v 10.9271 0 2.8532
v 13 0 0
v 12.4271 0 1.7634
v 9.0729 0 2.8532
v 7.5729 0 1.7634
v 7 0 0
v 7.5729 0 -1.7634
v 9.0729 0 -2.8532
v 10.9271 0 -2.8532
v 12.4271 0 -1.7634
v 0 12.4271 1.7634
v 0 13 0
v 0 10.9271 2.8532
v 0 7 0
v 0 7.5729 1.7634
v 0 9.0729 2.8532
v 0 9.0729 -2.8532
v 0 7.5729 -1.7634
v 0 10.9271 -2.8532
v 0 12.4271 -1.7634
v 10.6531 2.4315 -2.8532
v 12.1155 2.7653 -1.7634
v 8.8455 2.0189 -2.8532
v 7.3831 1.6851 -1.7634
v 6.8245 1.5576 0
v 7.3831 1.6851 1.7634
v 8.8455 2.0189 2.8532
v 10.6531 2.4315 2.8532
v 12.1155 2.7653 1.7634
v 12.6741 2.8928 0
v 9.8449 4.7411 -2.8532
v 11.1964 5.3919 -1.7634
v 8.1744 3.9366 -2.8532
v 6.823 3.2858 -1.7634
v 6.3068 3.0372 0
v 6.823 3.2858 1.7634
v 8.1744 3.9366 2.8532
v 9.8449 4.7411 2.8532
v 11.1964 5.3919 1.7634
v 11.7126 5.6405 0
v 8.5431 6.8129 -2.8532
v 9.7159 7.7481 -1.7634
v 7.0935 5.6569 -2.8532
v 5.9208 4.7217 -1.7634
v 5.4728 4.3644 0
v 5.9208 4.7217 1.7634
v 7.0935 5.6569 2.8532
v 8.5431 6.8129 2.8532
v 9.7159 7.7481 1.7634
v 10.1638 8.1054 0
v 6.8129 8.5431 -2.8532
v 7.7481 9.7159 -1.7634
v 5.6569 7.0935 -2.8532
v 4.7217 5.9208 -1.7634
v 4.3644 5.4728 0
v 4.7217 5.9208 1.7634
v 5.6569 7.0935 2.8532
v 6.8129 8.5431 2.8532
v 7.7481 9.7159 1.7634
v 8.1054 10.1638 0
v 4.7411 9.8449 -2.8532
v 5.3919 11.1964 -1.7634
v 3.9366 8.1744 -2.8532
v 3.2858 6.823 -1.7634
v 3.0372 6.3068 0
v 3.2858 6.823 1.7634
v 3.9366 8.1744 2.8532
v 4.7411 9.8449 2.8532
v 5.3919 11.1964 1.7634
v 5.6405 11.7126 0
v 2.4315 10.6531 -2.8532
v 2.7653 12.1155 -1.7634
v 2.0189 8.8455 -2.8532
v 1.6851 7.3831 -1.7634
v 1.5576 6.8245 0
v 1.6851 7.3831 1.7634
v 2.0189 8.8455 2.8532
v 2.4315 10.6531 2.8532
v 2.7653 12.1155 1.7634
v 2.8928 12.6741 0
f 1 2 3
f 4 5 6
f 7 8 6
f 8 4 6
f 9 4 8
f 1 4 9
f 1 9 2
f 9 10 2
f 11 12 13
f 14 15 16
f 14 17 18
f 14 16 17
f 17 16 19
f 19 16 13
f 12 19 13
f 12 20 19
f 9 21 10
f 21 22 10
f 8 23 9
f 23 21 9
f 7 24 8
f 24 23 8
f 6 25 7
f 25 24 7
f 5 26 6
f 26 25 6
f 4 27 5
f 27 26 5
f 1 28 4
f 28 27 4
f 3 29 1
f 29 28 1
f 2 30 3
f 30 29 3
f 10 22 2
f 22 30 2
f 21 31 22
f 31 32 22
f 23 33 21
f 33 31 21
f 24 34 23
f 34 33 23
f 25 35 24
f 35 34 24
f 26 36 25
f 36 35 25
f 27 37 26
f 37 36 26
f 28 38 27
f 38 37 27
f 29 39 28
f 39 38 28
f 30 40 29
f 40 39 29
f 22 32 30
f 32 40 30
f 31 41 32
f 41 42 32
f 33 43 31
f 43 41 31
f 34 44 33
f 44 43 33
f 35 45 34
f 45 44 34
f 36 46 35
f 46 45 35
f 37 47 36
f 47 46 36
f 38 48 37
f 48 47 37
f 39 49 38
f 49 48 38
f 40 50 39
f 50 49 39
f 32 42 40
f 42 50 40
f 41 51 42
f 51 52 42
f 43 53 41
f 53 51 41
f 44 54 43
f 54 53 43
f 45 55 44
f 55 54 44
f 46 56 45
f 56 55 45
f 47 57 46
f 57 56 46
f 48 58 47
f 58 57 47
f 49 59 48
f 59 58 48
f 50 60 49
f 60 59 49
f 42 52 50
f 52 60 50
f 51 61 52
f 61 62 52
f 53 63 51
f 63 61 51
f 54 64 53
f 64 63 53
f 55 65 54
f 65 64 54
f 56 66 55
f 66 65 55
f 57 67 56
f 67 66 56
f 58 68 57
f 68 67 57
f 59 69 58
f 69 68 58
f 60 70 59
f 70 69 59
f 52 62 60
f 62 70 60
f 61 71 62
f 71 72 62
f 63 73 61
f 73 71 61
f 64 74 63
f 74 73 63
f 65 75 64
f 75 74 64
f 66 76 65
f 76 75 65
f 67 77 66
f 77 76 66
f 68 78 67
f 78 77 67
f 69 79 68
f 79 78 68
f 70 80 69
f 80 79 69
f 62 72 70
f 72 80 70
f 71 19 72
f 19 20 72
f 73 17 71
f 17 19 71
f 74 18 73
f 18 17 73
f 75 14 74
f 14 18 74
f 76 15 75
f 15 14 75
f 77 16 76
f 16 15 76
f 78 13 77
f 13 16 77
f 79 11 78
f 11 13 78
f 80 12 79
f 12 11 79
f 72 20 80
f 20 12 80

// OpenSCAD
// Stage 2 of docs/audits/exact-geometry-rust.md: extrusions.
// A quarter torus: rotate_extrude(angle=90), which wraps the tube but not the axis.
// volume: 444.1321980490211
rotate_extrude(angle=90) translate([10, 0]) circle(3);
